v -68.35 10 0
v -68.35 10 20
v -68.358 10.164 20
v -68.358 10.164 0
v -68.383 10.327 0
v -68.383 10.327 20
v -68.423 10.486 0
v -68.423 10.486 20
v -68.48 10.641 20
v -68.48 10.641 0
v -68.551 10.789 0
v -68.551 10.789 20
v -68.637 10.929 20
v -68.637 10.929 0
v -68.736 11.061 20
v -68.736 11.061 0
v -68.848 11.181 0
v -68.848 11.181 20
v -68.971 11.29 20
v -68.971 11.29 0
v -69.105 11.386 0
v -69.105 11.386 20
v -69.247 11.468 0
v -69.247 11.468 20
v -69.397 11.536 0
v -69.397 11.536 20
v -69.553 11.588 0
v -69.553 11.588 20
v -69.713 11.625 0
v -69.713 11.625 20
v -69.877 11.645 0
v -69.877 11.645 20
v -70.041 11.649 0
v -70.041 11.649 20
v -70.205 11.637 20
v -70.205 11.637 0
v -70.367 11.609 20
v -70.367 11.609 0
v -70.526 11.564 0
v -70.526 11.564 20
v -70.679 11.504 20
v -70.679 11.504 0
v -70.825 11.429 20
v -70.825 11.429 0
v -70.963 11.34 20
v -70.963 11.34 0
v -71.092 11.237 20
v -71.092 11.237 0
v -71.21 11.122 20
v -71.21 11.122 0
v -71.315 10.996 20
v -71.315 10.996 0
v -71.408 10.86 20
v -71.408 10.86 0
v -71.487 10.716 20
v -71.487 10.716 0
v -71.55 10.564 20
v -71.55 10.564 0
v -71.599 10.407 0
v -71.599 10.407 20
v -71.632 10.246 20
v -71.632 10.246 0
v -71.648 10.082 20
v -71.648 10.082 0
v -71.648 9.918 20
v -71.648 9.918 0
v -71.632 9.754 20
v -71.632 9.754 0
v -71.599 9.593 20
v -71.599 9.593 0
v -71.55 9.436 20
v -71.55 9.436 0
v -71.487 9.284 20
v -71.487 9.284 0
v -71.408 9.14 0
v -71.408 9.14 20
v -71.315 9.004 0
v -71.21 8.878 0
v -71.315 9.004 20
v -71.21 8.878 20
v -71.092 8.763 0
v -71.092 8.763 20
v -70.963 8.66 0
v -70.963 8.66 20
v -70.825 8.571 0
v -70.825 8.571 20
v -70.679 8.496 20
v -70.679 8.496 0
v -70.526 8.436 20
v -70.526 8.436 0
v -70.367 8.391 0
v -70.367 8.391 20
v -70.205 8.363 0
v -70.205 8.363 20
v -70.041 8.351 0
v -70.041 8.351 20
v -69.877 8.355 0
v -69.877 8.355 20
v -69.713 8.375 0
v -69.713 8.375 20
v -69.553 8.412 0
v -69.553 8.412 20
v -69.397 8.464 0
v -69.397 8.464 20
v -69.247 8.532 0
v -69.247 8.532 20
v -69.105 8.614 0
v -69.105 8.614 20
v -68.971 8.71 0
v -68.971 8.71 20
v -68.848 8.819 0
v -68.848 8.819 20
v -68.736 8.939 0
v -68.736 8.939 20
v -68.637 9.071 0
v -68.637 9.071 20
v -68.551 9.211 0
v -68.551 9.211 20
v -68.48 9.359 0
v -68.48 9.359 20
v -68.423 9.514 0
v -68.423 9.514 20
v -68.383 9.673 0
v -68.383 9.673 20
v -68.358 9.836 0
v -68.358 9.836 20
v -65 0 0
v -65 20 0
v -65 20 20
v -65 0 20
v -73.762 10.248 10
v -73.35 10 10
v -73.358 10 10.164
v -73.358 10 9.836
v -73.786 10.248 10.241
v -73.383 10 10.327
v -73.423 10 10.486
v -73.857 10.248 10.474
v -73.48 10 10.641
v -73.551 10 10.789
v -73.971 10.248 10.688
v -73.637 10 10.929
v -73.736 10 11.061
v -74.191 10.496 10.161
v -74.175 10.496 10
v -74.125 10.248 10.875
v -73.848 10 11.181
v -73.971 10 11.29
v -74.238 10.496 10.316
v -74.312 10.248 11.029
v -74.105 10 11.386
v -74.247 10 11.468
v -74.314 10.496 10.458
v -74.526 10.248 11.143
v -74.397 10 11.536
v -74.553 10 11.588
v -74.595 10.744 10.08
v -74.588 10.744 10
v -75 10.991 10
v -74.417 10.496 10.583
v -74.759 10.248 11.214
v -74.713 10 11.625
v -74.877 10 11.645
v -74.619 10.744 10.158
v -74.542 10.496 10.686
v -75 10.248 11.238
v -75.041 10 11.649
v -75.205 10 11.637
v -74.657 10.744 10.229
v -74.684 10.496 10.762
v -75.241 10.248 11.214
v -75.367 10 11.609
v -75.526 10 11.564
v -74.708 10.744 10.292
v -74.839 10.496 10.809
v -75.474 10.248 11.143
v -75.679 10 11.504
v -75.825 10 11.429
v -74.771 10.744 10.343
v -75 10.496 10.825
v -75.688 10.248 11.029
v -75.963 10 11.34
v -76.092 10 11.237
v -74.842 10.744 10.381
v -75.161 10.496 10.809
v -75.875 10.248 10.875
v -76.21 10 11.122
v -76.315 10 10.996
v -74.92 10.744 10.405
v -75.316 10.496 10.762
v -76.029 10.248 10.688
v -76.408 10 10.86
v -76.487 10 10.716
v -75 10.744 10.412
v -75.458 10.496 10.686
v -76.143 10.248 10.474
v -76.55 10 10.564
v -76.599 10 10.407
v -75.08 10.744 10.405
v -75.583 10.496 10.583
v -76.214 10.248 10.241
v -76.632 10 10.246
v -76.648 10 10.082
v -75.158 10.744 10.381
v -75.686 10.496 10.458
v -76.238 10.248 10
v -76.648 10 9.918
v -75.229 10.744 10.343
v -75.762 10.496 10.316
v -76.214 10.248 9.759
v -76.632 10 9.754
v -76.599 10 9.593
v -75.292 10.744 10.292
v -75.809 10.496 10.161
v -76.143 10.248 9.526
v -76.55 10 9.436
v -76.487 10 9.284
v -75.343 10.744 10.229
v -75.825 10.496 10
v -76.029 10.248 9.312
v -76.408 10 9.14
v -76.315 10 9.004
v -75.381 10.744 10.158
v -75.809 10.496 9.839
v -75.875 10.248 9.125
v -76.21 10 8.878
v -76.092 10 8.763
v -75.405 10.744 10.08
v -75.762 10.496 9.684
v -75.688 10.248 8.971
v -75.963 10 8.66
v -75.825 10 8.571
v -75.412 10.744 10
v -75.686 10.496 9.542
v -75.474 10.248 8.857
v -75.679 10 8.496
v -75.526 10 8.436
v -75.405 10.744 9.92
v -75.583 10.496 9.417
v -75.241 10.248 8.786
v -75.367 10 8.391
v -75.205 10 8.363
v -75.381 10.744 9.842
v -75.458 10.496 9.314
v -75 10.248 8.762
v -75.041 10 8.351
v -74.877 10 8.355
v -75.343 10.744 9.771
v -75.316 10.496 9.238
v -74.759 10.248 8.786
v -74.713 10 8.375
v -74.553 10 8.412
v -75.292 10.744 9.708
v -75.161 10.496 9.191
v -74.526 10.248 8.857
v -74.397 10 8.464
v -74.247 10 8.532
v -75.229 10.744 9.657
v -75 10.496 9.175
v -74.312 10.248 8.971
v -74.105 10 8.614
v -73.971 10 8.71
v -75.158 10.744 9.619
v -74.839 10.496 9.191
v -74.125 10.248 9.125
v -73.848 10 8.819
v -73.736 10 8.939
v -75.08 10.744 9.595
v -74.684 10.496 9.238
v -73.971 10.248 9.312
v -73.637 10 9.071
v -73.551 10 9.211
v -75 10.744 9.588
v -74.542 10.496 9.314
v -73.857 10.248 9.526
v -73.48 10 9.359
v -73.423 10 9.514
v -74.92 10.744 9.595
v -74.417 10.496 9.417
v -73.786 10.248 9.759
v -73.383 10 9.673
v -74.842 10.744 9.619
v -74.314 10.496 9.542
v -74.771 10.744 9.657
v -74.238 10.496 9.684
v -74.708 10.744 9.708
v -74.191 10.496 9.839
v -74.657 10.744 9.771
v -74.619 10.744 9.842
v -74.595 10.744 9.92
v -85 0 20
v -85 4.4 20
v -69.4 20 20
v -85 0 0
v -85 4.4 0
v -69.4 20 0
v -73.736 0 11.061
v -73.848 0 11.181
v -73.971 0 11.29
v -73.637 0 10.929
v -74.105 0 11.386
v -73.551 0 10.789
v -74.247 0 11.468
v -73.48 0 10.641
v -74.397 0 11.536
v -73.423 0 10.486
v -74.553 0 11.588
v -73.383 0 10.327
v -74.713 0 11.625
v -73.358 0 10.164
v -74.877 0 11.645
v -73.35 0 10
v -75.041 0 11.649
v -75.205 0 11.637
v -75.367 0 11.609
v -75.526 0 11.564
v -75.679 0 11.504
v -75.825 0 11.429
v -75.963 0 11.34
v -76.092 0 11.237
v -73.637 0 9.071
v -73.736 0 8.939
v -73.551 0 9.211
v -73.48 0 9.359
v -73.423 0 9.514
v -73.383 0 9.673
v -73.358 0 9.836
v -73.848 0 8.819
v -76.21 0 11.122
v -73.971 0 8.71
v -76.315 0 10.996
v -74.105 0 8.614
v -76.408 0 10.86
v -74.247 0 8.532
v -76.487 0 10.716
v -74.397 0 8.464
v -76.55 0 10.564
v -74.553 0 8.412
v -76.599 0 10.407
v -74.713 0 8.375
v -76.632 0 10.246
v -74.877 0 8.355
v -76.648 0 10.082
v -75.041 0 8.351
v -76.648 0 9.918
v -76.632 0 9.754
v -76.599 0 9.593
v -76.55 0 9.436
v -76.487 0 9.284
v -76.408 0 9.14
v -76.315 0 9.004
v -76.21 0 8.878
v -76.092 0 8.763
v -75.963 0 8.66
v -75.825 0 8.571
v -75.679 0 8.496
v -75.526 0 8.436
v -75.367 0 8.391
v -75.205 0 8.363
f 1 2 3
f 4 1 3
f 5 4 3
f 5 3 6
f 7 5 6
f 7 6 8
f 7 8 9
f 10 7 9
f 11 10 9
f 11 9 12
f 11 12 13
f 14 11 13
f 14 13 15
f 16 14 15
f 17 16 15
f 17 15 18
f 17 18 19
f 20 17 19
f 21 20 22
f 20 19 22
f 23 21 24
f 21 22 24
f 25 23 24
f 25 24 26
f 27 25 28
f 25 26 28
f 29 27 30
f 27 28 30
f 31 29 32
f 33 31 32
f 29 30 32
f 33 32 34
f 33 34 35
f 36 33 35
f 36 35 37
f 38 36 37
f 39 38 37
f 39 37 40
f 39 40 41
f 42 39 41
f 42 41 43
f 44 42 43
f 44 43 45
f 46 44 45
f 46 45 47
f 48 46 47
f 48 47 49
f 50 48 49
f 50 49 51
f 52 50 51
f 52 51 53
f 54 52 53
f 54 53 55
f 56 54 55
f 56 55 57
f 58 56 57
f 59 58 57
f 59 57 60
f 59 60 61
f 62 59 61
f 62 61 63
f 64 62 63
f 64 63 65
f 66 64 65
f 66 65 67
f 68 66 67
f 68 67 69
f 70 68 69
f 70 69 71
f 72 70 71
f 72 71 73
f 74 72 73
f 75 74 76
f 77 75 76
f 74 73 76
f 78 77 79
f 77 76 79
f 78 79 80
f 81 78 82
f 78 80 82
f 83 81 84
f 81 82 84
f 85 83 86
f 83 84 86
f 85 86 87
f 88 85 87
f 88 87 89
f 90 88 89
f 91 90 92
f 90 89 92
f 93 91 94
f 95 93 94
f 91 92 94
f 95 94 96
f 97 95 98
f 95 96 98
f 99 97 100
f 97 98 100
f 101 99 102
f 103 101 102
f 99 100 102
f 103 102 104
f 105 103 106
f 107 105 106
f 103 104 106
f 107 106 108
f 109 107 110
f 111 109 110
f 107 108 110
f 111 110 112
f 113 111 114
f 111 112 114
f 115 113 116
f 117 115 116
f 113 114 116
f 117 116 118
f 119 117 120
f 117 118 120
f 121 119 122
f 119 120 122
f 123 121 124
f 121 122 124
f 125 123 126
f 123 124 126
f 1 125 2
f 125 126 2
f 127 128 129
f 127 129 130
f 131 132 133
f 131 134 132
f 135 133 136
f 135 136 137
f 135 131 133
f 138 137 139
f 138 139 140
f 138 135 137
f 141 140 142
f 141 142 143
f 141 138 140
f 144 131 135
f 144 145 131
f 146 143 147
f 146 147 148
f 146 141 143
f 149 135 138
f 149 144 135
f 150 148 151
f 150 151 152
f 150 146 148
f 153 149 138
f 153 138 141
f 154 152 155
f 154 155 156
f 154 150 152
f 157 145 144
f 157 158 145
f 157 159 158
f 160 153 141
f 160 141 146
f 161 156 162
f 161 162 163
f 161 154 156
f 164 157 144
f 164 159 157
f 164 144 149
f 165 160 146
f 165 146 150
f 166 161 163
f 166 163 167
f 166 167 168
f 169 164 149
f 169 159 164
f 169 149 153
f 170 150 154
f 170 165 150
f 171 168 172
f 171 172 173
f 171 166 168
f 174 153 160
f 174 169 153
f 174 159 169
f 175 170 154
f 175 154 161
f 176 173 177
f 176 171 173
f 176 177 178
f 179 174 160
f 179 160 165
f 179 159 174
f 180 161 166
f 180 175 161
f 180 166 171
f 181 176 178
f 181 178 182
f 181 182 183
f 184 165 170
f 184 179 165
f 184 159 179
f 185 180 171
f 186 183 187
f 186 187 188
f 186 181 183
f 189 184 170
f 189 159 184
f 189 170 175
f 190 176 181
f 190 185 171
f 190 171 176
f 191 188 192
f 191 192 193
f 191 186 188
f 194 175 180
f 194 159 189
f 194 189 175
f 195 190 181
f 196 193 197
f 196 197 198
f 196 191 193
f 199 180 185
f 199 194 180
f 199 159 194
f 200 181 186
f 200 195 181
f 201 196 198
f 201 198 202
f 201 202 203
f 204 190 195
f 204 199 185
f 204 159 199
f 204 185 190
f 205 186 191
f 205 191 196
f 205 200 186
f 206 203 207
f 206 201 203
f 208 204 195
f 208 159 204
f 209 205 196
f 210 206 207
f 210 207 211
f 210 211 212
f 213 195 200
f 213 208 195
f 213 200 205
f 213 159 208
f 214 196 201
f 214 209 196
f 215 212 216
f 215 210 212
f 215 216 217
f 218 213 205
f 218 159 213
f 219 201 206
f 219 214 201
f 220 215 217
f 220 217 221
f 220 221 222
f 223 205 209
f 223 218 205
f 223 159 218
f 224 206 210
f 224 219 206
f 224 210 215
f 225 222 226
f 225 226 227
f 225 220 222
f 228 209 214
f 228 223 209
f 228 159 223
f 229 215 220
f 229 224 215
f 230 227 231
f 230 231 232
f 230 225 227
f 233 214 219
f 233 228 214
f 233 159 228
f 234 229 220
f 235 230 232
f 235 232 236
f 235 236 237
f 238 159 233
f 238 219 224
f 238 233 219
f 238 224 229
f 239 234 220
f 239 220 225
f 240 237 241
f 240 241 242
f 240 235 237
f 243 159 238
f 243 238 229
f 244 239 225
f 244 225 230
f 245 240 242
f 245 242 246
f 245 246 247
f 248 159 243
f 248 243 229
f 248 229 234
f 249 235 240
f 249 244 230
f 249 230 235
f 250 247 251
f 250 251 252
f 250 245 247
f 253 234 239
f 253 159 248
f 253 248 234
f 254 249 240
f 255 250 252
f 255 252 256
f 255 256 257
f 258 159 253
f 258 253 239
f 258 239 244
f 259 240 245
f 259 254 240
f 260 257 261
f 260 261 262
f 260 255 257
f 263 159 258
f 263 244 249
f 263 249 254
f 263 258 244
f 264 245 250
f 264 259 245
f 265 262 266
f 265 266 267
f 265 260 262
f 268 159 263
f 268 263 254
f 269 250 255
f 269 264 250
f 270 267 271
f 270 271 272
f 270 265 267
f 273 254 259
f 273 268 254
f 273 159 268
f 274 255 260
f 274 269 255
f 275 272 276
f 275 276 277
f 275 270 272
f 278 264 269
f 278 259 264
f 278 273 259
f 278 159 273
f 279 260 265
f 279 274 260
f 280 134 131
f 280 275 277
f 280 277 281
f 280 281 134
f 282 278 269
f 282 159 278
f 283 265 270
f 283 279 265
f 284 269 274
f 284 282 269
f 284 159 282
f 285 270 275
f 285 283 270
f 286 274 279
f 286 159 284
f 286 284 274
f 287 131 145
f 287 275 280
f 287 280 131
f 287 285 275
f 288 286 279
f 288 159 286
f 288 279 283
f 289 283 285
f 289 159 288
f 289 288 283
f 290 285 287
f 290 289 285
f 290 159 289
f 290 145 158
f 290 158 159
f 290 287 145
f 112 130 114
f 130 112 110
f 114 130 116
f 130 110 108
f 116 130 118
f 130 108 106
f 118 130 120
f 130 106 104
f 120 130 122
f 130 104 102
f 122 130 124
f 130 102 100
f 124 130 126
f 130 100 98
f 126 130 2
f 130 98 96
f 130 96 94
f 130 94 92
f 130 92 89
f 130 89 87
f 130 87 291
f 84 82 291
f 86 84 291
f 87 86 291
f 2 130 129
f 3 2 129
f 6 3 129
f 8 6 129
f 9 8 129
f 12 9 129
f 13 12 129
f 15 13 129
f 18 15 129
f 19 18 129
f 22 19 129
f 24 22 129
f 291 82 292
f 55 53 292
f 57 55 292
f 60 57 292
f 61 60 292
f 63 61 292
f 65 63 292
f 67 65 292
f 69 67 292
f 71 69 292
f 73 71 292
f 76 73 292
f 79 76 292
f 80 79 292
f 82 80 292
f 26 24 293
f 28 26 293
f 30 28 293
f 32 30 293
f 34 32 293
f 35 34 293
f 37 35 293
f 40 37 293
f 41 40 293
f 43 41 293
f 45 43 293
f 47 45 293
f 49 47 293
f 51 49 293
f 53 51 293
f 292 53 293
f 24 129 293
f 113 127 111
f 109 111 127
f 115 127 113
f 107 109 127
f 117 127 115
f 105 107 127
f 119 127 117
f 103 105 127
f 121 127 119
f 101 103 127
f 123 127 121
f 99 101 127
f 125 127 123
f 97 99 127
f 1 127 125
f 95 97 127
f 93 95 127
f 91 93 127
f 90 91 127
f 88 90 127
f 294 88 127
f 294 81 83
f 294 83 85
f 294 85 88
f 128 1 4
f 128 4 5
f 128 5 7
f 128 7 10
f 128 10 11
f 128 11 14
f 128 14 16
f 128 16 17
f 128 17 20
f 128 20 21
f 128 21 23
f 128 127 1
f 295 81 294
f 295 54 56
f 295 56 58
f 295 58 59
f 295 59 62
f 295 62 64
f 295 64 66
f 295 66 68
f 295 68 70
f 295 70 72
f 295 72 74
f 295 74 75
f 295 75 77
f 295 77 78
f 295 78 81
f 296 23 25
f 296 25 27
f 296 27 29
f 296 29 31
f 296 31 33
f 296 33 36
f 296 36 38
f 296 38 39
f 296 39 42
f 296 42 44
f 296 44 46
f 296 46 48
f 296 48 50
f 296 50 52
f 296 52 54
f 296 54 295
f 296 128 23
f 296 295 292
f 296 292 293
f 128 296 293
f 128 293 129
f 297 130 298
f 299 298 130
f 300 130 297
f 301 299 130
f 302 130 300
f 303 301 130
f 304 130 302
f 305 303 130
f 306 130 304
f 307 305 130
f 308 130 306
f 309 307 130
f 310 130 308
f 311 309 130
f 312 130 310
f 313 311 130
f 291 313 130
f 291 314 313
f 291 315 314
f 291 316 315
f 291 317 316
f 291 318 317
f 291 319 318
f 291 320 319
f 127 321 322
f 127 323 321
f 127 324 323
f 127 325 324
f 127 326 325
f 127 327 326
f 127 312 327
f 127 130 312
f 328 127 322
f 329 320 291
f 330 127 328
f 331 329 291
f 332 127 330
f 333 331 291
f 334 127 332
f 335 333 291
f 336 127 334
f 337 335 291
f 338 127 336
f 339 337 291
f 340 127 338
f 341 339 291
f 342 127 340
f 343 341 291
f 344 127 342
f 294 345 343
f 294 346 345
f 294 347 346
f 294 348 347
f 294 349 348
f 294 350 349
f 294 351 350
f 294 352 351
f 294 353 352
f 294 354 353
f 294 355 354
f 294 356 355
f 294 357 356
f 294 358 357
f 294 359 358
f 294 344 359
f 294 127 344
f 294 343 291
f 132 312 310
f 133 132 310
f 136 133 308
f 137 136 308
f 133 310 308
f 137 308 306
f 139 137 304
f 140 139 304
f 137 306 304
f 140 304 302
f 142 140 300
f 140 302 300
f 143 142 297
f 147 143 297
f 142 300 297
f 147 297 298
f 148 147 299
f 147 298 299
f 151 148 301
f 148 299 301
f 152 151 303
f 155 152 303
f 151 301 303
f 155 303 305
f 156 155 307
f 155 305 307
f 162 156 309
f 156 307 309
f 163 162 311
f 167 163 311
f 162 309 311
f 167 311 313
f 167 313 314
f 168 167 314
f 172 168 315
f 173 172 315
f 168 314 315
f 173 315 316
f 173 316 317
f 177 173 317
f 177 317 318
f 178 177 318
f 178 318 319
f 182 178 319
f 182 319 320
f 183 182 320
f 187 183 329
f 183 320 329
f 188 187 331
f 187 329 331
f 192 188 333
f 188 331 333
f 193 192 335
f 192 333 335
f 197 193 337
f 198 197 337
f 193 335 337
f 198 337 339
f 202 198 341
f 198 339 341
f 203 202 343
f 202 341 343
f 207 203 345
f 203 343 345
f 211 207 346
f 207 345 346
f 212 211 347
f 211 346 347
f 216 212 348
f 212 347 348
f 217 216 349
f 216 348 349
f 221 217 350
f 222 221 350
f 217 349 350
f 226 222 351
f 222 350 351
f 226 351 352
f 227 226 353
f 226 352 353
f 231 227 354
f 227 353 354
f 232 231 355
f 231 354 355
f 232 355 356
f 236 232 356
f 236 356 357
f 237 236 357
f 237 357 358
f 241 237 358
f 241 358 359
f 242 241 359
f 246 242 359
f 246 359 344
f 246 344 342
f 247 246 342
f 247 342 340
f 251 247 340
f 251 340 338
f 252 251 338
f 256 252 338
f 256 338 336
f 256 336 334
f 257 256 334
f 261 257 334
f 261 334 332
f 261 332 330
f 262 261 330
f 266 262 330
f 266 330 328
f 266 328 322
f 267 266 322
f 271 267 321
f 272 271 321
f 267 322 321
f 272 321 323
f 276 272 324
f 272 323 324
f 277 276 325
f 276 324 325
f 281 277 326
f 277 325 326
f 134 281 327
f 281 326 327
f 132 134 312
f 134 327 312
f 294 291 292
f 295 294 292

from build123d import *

# Parameters (mm, degrees)
PAD_DEPTH     = 20
SKETCH001_R   = 1.65
HOLE_DEPTH    = 10
HOLE_TIPS_R   = 1.65
SKETCH002_R   = 1.65
HOLE001_DEPTH = 20.001


with BuildPart() as part:
    # Sketch → Pad (new body)
    with BuildSketch(Plane.XY):
        Polygon((-65, 0), (-85, 0), (-85, 4.4), (-69.4, 20), (-65, 20), align=None)
    extrude(amount=PAD_DEPTH)

    # Sketch001 (on Face1 of Pad) → Hole (cut)
    with BuildSketch(Plane.XZ):
        with Locations((-75, 10)):
            Circle(SKETCH001_R)
    extrude(amount=-HOLE_DEPTH, mode=Mode.SUBTRACT)

    # Hole tips → Hole tip 1 section 0
    with BuildSketch(Plane.XZ.offset(-10), mode=Mode.PRIVATE) as hole_tip_1_s0:
        with Locations((-75, 10)):
            Circle(HOLE_TIPS_R)
    loft([hole_tip_1_s0.sketch, Vertex(-75, 10.99142, 10)], mode=Mode.SUBTRACT)

    # Sketch002 (on Face4 of Hole) → Hole001 (cut, through all)
    with BuildSketch(Plane.XY.offset(20)):
        with Locations((-70, 10)):
            Circle(SKETCH002_R)
    extrude(amount=-HOLE001_DEPTH, mode=Mode.SUBTRACT)


solid = part.part
